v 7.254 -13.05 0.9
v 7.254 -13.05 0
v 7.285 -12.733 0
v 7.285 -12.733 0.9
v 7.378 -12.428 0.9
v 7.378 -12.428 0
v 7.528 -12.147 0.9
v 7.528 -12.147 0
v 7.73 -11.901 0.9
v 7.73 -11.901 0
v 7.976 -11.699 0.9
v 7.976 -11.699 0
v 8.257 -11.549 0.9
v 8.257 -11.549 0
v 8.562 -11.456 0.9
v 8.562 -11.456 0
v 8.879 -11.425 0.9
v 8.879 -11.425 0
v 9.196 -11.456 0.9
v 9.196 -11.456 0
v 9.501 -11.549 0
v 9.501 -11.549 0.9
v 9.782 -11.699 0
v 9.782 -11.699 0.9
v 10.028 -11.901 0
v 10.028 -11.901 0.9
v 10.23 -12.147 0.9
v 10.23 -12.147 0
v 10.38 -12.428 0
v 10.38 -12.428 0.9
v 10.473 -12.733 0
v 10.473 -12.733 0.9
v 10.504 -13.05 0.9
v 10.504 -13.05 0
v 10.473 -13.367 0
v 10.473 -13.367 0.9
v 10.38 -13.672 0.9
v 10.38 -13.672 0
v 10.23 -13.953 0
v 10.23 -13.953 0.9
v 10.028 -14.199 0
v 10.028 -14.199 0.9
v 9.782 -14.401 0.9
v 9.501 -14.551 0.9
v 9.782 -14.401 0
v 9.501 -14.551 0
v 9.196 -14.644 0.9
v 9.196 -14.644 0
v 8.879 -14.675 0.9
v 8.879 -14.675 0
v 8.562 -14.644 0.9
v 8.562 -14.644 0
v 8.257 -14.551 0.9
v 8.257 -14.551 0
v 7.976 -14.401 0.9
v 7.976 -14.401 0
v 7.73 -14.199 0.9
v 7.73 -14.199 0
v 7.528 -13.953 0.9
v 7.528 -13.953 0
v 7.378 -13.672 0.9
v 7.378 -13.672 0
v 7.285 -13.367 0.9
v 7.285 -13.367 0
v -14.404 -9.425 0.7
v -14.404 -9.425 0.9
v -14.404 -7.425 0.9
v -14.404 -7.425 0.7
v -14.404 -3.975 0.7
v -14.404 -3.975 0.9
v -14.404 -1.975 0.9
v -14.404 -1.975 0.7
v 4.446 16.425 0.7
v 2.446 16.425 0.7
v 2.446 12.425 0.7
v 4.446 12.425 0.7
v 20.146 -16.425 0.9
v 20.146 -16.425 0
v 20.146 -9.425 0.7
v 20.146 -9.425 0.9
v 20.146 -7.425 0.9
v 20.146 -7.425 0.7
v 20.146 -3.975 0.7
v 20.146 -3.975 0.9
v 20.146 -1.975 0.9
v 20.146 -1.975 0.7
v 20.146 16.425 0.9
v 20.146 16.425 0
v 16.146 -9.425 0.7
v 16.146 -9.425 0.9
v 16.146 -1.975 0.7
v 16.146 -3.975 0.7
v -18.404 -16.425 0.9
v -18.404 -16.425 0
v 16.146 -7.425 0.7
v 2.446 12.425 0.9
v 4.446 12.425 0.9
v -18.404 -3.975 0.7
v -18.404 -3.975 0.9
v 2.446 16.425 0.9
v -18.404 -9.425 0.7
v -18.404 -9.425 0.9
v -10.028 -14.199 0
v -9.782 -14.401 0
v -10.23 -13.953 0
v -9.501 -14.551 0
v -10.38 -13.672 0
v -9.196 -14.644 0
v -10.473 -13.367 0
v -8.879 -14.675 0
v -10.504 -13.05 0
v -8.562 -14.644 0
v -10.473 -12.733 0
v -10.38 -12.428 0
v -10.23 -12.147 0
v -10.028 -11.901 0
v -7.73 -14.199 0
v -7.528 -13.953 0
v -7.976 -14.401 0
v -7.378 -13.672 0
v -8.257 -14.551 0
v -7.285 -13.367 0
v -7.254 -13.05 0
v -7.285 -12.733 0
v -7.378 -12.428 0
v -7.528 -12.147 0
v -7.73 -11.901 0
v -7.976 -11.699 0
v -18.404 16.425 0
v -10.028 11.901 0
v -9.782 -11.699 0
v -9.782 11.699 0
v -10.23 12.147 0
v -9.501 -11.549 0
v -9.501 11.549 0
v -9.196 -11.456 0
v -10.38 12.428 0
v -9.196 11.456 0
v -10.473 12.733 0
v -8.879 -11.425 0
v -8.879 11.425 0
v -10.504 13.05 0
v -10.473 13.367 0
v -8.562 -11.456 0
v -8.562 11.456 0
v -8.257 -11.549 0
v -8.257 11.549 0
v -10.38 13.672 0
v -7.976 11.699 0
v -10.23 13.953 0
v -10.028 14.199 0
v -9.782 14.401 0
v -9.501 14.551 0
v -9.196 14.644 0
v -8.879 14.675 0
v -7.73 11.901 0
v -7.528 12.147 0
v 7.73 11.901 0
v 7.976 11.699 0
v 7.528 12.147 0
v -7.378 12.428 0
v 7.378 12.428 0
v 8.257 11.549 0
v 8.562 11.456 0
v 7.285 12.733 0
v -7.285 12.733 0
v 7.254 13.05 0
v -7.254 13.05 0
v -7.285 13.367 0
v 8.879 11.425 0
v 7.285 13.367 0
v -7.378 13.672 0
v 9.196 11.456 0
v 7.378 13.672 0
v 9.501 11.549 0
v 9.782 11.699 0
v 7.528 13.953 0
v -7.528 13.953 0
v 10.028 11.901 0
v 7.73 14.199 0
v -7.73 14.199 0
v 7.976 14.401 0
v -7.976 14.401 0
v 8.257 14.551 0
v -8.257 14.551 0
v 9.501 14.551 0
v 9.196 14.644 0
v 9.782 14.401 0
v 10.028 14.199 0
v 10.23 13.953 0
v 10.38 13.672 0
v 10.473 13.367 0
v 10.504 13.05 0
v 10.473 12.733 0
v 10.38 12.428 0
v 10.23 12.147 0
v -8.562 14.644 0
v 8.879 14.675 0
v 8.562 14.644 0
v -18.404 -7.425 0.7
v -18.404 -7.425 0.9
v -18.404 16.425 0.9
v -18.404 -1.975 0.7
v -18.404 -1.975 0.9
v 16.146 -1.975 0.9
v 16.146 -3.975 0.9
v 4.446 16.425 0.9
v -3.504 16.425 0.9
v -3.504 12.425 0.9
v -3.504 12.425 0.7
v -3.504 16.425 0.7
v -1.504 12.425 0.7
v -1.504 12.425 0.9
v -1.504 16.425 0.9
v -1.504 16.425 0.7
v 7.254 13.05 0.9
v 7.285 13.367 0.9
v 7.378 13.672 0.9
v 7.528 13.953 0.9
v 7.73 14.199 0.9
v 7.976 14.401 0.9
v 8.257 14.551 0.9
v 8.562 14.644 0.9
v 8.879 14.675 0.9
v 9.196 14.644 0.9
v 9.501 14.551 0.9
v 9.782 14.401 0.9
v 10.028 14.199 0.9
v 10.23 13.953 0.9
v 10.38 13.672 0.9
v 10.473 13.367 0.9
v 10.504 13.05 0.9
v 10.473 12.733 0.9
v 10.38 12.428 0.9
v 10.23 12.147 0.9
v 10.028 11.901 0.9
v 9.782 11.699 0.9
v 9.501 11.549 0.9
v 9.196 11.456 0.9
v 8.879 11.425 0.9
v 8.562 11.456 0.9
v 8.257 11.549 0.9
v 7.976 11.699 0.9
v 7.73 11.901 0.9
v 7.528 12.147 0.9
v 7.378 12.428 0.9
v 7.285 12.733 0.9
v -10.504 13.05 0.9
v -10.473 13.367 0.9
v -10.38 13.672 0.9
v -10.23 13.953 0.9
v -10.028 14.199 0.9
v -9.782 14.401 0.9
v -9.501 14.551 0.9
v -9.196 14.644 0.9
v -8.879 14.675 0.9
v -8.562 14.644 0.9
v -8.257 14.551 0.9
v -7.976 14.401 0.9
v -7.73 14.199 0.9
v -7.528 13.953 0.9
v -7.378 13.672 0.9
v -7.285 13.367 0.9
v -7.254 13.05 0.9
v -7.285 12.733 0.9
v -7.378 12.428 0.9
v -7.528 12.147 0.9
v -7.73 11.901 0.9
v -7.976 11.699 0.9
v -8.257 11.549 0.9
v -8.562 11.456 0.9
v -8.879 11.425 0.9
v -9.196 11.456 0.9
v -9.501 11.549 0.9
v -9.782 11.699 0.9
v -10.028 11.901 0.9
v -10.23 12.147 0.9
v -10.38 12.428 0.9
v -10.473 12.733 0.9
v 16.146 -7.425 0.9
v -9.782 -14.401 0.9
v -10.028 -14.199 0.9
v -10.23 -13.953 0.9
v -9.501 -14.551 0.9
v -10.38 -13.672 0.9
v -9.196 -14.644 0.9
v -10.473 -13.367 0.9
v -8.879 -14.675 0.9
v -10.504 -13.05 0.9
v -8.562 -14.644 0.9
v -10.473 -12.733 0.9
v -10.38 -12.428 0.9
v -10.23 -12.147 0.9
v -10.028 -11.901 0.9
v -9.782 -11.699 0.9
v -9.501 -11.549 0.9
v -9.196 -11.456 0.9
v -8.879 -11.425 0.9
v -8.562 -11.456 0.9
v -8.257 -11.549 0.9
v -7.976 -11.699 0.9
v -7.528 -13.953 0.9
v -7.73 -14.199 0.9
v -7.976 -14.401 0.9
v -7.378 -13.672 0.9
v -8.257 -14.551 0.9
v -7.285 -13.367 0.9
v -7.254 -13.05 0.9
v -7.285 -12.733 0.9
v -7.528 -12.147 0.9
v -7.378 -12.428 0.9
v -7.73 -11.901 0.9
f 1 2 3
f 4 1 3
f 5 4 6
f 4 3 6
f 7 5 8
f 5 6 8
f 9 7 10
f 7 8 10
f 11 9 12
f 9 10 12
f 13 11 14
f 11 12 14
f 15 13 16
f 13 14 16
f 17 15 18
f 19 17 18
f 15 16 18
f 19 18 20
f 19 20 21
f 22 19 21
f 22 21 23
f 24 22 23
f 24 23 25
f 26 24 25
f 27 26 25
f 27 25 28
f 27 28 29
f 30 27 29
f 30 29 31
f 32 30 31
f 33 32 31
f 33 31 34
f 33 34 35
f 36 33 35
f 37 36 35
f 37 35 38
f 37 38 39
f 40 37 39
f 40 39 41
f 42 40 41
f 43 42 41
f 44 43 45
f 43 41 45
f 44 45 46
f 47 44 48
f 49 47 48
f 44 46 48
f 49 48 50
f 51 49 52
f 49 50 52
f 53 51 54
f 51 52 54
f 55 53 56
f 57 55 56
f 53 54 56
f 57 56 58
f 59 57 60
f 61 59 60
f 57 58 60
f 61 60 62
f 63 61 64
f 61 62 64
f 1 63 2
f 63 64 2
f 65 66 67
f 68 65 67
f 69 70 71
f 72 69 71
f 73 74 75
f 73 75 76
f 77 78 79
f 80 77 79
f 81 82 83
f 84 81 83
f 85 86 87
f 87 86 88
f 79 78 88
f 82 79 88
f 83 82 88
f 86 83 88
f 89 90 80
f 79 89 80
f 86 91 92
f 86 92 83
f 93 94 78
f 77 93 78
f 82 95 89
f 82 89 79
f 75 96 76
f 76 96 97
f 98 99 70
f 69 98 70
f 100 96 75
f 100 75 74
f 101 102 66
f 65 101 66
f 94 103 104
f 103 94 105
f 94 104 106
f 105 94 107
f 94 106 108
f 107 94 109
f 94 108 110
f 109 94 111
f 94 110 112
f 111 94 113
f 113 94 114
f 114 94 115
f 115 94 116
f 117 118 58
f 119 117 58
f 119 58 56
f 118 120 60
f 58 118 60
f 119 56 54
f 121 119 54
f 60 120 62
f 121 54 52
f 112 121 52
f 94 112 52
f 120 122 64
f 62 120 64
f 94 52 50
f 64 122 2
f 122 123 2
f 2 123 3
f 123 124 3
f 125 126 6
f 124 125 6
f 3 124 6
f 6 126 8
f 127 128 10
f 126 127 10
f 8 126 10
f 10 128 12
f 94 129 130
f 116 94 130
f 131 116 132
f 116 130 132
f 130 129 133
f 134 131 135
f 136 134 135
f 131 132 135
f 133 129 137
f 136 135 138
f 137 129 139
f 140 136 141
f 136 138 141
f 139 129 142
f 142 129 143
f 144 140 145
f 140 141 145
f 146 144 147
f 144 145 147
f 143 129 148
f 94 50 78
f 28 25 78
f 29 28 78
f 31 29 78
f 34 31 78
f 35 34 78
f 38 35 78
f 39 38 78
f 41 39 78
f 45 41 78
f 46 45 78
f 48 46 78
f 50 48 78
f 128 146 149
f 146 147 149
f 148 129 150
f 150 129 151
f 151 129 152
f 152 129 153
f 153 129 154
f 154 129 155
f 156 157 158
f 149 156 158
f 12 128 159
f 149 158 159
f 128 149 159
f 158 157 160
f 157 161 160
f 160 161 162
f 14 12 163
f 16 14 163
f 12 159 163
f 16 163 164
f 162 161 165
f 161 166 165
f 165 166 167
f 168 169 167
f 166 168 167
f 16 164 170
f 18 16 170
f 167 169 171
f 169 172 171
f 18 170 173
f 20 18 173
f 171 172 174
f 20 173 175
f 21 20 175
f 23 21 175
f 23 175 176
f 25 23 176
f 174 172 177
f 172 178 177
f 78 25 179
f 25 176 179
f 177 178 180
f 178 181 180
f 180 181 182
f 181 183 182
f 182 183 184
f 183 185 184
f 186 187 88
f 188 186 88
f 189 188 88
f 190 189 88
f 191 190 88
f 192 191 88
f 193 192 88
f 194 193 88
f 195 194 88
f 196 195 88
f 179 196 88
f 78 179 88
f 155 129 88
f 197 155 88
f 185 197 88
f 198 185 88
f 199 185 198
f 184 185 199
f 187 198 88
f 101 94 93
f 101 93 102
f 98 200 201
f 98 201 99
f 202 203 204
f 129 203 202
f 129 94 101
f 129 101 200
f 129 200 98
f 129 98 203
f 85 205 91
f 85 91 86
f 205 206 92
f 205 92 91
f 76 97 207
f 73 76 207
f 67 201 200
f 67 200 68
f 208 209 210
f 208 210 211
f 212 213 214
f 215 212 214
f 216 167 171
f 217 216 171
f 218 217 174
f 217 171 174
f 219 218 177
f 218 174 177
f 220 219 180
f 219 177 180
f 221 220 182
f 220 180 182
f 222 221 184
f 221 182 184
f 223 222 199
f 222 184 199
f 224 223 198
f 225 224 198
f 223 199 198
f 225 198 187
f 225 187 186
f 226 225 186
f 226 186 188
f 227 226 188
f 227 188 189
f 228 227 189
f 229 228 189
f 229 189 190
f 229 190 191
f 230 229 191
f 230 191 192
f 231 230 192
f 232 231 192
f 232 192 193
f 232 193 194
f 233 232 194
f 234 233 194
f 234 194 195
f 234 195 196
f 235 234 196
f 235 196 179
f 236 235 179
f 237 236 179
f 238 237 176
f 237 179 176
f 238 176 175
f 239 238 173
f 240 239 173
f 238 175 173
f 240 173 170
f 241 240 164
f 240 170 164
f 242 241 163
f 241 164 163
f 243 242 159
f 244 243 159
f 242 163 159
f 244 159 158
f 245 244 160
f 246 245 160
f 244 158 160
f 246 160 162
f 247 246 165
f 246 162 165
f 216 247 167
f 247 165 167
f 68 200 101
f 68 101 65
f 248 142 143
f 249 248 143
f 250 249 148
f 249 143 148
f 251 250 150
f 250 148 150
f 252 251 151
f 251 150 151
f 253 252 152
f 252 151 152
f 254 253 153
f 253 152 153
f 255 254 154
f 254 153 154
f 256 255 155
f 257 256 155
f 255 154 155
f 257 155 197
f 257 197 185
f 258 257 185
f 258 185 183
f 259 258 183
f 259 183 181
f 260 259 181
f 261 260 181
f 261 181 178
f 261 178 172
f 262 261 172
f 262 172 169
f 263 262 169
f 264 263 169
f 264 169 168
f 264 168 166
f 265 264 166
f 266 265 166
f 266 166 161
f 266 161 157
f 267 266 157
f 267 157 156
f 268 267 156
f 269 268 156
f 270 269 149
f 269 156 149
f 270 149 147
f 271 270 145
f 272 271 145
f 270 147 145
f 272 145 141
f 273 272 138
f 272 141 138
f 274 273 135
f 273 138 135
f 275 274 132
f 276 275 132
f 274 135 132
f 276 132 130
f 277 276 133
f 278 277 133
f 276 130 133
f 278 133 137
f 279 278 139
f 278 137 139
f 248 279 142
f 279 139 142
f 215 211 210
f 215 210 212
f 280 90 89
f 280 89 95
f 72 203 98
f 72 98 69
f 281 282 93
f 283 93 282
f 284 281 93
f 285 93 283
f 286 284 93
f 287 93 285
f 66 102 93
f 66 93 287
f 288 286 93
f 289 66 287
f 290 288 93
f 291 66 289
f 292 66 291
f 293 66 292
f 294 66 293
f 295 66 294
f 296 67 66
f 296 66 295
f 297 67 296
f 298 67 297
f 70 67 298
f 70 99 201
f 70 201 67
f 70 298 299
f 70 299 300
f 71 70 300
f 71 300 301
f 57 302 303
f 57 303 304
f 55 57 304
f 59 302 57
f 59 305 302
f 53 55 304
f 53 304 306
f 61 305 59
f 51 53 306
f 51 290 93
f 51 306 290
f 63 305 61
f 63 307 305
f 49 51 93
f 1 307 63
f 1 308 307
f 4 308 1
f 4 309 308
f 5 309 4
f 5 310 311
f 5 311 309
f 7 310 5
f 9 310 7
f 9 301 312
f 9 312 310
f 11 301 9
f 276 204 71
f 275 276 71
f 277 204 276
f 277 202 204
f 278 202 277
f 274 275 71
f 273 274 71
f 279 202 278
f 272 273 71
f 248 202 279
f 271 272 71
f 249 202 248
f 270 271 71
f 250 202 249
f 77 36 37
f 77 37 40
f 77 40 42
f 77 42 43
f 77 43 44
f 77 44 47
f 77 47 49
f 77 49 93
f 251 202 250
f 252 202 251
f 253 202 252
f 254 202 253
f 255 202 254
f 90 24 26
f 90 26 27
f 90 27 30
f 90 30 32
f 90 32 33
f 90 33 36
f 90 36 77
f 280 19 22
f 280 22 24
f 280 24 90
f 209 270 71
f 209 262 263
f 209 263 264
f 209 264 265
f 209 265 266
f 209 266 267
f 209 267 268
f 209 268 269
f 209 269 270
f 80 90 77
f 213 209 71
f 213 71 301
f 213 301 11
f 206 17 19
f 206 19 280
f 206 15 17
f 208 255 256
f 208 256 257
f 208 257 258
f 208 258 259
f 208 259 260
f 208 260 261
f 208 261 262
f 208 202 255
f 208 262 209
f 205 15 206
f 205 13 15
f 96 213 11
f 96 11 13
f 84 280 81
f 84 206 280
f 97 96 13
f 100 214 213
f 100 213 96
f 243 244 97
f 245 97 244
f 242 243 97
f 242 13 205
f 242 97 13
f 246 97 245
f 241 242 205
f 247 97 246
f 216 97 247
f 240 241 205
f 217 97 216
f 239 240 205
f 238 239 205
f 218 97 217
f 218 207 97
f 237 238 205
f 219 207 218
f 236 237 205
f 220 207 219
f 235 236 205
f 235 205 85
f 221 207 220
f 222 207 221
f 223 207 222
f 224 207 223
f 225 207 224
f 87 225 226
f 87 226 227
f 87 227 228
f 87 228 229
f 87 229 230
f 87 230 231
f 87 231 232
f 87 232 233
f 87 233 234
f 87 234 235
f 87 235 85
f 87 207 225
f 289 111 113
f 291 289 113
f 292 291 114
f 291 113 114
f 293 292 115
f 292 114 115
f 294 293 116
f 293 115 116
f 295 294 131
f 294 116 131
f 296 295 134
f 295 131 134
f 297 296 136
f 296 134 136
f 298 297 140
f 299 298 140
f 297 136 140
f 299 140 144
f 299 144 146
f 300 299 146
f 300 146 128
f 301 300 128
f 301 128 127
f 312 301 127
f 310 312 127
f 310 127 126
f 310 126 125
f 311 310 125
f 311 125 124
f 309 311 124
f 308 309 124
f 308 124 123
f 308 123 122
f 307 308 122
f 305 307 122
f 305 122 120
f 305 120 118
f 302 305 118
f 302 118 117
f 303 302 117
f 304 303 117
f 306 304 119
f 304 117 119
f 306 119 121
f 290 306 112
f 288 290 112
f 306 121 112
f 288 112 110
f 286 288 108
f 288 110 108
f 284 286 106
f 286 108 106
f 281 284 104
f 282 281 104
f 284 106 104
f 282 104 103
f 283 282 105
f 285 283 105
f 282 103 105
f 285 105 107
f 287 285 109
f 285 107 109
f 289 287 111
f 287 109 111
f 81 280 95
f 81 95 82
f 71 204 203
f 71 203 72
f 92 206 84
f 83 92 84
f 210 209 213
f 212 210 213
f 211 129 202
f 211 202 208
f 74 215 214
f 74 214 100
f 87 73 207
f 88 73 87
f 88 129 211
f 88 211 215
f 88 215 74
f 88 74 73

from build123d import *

# Parameters (mm, degrees)
F0_W     = 38.55
F0_H     = 32.85
F1_DEPTH = 0.9
F3_D     = 3.25
F4_W     = 2
F4_H     = 4
F4_W_2   = 4
F4_H_2   = 2
F5_DEPTH = 0.2


with BuildPart() as f1:
    # F0 (on Top) → F1 (new body)
    with BuildSketch(Plane.XY):
        with Locations((0.870858, 0)):
            Rectangle(F0_W, F0_H)
    extrude(amount=F1_DEPTH)

    # F3 (through all)
    with Locations(Plane.XY.offset(0.9)):
        with Locations((-8.879142, 13.05), (8.879142, 13.05), (8.879142, -13.05), (-8.879142, -13.05)):
            Hole(F3_D / 2)

    # F4 (on face) → F5 (cut)
    with BuildSketch(Plane.XY.offset(0.9)):
        with Locations((-2.504142, 14.425)):
            Rectangle(F4_W, F4_H)
        with Locations((3.445858, 14.425)):
            Rectangle(F4_W, F4_H)
        with Locations((18.145858, -2.975)):
            Rectangle(F4_W_2, F4_H_2)
        with Locations((18.145858, -8.425)):
            Rectangle(F4_W_2, F4_H_2)
        with Locations((-16.404142, -8.425)):
            Rectangle(F4_W_2, F4_H_2)
        with Locations((-16.404142, -2.975)):
            Rectangle(F4_W_2, F4_H_2)
    extrude(amount=-F5_DEPTH, mode=Mode.SUBTRACT)


solid = f1.part
